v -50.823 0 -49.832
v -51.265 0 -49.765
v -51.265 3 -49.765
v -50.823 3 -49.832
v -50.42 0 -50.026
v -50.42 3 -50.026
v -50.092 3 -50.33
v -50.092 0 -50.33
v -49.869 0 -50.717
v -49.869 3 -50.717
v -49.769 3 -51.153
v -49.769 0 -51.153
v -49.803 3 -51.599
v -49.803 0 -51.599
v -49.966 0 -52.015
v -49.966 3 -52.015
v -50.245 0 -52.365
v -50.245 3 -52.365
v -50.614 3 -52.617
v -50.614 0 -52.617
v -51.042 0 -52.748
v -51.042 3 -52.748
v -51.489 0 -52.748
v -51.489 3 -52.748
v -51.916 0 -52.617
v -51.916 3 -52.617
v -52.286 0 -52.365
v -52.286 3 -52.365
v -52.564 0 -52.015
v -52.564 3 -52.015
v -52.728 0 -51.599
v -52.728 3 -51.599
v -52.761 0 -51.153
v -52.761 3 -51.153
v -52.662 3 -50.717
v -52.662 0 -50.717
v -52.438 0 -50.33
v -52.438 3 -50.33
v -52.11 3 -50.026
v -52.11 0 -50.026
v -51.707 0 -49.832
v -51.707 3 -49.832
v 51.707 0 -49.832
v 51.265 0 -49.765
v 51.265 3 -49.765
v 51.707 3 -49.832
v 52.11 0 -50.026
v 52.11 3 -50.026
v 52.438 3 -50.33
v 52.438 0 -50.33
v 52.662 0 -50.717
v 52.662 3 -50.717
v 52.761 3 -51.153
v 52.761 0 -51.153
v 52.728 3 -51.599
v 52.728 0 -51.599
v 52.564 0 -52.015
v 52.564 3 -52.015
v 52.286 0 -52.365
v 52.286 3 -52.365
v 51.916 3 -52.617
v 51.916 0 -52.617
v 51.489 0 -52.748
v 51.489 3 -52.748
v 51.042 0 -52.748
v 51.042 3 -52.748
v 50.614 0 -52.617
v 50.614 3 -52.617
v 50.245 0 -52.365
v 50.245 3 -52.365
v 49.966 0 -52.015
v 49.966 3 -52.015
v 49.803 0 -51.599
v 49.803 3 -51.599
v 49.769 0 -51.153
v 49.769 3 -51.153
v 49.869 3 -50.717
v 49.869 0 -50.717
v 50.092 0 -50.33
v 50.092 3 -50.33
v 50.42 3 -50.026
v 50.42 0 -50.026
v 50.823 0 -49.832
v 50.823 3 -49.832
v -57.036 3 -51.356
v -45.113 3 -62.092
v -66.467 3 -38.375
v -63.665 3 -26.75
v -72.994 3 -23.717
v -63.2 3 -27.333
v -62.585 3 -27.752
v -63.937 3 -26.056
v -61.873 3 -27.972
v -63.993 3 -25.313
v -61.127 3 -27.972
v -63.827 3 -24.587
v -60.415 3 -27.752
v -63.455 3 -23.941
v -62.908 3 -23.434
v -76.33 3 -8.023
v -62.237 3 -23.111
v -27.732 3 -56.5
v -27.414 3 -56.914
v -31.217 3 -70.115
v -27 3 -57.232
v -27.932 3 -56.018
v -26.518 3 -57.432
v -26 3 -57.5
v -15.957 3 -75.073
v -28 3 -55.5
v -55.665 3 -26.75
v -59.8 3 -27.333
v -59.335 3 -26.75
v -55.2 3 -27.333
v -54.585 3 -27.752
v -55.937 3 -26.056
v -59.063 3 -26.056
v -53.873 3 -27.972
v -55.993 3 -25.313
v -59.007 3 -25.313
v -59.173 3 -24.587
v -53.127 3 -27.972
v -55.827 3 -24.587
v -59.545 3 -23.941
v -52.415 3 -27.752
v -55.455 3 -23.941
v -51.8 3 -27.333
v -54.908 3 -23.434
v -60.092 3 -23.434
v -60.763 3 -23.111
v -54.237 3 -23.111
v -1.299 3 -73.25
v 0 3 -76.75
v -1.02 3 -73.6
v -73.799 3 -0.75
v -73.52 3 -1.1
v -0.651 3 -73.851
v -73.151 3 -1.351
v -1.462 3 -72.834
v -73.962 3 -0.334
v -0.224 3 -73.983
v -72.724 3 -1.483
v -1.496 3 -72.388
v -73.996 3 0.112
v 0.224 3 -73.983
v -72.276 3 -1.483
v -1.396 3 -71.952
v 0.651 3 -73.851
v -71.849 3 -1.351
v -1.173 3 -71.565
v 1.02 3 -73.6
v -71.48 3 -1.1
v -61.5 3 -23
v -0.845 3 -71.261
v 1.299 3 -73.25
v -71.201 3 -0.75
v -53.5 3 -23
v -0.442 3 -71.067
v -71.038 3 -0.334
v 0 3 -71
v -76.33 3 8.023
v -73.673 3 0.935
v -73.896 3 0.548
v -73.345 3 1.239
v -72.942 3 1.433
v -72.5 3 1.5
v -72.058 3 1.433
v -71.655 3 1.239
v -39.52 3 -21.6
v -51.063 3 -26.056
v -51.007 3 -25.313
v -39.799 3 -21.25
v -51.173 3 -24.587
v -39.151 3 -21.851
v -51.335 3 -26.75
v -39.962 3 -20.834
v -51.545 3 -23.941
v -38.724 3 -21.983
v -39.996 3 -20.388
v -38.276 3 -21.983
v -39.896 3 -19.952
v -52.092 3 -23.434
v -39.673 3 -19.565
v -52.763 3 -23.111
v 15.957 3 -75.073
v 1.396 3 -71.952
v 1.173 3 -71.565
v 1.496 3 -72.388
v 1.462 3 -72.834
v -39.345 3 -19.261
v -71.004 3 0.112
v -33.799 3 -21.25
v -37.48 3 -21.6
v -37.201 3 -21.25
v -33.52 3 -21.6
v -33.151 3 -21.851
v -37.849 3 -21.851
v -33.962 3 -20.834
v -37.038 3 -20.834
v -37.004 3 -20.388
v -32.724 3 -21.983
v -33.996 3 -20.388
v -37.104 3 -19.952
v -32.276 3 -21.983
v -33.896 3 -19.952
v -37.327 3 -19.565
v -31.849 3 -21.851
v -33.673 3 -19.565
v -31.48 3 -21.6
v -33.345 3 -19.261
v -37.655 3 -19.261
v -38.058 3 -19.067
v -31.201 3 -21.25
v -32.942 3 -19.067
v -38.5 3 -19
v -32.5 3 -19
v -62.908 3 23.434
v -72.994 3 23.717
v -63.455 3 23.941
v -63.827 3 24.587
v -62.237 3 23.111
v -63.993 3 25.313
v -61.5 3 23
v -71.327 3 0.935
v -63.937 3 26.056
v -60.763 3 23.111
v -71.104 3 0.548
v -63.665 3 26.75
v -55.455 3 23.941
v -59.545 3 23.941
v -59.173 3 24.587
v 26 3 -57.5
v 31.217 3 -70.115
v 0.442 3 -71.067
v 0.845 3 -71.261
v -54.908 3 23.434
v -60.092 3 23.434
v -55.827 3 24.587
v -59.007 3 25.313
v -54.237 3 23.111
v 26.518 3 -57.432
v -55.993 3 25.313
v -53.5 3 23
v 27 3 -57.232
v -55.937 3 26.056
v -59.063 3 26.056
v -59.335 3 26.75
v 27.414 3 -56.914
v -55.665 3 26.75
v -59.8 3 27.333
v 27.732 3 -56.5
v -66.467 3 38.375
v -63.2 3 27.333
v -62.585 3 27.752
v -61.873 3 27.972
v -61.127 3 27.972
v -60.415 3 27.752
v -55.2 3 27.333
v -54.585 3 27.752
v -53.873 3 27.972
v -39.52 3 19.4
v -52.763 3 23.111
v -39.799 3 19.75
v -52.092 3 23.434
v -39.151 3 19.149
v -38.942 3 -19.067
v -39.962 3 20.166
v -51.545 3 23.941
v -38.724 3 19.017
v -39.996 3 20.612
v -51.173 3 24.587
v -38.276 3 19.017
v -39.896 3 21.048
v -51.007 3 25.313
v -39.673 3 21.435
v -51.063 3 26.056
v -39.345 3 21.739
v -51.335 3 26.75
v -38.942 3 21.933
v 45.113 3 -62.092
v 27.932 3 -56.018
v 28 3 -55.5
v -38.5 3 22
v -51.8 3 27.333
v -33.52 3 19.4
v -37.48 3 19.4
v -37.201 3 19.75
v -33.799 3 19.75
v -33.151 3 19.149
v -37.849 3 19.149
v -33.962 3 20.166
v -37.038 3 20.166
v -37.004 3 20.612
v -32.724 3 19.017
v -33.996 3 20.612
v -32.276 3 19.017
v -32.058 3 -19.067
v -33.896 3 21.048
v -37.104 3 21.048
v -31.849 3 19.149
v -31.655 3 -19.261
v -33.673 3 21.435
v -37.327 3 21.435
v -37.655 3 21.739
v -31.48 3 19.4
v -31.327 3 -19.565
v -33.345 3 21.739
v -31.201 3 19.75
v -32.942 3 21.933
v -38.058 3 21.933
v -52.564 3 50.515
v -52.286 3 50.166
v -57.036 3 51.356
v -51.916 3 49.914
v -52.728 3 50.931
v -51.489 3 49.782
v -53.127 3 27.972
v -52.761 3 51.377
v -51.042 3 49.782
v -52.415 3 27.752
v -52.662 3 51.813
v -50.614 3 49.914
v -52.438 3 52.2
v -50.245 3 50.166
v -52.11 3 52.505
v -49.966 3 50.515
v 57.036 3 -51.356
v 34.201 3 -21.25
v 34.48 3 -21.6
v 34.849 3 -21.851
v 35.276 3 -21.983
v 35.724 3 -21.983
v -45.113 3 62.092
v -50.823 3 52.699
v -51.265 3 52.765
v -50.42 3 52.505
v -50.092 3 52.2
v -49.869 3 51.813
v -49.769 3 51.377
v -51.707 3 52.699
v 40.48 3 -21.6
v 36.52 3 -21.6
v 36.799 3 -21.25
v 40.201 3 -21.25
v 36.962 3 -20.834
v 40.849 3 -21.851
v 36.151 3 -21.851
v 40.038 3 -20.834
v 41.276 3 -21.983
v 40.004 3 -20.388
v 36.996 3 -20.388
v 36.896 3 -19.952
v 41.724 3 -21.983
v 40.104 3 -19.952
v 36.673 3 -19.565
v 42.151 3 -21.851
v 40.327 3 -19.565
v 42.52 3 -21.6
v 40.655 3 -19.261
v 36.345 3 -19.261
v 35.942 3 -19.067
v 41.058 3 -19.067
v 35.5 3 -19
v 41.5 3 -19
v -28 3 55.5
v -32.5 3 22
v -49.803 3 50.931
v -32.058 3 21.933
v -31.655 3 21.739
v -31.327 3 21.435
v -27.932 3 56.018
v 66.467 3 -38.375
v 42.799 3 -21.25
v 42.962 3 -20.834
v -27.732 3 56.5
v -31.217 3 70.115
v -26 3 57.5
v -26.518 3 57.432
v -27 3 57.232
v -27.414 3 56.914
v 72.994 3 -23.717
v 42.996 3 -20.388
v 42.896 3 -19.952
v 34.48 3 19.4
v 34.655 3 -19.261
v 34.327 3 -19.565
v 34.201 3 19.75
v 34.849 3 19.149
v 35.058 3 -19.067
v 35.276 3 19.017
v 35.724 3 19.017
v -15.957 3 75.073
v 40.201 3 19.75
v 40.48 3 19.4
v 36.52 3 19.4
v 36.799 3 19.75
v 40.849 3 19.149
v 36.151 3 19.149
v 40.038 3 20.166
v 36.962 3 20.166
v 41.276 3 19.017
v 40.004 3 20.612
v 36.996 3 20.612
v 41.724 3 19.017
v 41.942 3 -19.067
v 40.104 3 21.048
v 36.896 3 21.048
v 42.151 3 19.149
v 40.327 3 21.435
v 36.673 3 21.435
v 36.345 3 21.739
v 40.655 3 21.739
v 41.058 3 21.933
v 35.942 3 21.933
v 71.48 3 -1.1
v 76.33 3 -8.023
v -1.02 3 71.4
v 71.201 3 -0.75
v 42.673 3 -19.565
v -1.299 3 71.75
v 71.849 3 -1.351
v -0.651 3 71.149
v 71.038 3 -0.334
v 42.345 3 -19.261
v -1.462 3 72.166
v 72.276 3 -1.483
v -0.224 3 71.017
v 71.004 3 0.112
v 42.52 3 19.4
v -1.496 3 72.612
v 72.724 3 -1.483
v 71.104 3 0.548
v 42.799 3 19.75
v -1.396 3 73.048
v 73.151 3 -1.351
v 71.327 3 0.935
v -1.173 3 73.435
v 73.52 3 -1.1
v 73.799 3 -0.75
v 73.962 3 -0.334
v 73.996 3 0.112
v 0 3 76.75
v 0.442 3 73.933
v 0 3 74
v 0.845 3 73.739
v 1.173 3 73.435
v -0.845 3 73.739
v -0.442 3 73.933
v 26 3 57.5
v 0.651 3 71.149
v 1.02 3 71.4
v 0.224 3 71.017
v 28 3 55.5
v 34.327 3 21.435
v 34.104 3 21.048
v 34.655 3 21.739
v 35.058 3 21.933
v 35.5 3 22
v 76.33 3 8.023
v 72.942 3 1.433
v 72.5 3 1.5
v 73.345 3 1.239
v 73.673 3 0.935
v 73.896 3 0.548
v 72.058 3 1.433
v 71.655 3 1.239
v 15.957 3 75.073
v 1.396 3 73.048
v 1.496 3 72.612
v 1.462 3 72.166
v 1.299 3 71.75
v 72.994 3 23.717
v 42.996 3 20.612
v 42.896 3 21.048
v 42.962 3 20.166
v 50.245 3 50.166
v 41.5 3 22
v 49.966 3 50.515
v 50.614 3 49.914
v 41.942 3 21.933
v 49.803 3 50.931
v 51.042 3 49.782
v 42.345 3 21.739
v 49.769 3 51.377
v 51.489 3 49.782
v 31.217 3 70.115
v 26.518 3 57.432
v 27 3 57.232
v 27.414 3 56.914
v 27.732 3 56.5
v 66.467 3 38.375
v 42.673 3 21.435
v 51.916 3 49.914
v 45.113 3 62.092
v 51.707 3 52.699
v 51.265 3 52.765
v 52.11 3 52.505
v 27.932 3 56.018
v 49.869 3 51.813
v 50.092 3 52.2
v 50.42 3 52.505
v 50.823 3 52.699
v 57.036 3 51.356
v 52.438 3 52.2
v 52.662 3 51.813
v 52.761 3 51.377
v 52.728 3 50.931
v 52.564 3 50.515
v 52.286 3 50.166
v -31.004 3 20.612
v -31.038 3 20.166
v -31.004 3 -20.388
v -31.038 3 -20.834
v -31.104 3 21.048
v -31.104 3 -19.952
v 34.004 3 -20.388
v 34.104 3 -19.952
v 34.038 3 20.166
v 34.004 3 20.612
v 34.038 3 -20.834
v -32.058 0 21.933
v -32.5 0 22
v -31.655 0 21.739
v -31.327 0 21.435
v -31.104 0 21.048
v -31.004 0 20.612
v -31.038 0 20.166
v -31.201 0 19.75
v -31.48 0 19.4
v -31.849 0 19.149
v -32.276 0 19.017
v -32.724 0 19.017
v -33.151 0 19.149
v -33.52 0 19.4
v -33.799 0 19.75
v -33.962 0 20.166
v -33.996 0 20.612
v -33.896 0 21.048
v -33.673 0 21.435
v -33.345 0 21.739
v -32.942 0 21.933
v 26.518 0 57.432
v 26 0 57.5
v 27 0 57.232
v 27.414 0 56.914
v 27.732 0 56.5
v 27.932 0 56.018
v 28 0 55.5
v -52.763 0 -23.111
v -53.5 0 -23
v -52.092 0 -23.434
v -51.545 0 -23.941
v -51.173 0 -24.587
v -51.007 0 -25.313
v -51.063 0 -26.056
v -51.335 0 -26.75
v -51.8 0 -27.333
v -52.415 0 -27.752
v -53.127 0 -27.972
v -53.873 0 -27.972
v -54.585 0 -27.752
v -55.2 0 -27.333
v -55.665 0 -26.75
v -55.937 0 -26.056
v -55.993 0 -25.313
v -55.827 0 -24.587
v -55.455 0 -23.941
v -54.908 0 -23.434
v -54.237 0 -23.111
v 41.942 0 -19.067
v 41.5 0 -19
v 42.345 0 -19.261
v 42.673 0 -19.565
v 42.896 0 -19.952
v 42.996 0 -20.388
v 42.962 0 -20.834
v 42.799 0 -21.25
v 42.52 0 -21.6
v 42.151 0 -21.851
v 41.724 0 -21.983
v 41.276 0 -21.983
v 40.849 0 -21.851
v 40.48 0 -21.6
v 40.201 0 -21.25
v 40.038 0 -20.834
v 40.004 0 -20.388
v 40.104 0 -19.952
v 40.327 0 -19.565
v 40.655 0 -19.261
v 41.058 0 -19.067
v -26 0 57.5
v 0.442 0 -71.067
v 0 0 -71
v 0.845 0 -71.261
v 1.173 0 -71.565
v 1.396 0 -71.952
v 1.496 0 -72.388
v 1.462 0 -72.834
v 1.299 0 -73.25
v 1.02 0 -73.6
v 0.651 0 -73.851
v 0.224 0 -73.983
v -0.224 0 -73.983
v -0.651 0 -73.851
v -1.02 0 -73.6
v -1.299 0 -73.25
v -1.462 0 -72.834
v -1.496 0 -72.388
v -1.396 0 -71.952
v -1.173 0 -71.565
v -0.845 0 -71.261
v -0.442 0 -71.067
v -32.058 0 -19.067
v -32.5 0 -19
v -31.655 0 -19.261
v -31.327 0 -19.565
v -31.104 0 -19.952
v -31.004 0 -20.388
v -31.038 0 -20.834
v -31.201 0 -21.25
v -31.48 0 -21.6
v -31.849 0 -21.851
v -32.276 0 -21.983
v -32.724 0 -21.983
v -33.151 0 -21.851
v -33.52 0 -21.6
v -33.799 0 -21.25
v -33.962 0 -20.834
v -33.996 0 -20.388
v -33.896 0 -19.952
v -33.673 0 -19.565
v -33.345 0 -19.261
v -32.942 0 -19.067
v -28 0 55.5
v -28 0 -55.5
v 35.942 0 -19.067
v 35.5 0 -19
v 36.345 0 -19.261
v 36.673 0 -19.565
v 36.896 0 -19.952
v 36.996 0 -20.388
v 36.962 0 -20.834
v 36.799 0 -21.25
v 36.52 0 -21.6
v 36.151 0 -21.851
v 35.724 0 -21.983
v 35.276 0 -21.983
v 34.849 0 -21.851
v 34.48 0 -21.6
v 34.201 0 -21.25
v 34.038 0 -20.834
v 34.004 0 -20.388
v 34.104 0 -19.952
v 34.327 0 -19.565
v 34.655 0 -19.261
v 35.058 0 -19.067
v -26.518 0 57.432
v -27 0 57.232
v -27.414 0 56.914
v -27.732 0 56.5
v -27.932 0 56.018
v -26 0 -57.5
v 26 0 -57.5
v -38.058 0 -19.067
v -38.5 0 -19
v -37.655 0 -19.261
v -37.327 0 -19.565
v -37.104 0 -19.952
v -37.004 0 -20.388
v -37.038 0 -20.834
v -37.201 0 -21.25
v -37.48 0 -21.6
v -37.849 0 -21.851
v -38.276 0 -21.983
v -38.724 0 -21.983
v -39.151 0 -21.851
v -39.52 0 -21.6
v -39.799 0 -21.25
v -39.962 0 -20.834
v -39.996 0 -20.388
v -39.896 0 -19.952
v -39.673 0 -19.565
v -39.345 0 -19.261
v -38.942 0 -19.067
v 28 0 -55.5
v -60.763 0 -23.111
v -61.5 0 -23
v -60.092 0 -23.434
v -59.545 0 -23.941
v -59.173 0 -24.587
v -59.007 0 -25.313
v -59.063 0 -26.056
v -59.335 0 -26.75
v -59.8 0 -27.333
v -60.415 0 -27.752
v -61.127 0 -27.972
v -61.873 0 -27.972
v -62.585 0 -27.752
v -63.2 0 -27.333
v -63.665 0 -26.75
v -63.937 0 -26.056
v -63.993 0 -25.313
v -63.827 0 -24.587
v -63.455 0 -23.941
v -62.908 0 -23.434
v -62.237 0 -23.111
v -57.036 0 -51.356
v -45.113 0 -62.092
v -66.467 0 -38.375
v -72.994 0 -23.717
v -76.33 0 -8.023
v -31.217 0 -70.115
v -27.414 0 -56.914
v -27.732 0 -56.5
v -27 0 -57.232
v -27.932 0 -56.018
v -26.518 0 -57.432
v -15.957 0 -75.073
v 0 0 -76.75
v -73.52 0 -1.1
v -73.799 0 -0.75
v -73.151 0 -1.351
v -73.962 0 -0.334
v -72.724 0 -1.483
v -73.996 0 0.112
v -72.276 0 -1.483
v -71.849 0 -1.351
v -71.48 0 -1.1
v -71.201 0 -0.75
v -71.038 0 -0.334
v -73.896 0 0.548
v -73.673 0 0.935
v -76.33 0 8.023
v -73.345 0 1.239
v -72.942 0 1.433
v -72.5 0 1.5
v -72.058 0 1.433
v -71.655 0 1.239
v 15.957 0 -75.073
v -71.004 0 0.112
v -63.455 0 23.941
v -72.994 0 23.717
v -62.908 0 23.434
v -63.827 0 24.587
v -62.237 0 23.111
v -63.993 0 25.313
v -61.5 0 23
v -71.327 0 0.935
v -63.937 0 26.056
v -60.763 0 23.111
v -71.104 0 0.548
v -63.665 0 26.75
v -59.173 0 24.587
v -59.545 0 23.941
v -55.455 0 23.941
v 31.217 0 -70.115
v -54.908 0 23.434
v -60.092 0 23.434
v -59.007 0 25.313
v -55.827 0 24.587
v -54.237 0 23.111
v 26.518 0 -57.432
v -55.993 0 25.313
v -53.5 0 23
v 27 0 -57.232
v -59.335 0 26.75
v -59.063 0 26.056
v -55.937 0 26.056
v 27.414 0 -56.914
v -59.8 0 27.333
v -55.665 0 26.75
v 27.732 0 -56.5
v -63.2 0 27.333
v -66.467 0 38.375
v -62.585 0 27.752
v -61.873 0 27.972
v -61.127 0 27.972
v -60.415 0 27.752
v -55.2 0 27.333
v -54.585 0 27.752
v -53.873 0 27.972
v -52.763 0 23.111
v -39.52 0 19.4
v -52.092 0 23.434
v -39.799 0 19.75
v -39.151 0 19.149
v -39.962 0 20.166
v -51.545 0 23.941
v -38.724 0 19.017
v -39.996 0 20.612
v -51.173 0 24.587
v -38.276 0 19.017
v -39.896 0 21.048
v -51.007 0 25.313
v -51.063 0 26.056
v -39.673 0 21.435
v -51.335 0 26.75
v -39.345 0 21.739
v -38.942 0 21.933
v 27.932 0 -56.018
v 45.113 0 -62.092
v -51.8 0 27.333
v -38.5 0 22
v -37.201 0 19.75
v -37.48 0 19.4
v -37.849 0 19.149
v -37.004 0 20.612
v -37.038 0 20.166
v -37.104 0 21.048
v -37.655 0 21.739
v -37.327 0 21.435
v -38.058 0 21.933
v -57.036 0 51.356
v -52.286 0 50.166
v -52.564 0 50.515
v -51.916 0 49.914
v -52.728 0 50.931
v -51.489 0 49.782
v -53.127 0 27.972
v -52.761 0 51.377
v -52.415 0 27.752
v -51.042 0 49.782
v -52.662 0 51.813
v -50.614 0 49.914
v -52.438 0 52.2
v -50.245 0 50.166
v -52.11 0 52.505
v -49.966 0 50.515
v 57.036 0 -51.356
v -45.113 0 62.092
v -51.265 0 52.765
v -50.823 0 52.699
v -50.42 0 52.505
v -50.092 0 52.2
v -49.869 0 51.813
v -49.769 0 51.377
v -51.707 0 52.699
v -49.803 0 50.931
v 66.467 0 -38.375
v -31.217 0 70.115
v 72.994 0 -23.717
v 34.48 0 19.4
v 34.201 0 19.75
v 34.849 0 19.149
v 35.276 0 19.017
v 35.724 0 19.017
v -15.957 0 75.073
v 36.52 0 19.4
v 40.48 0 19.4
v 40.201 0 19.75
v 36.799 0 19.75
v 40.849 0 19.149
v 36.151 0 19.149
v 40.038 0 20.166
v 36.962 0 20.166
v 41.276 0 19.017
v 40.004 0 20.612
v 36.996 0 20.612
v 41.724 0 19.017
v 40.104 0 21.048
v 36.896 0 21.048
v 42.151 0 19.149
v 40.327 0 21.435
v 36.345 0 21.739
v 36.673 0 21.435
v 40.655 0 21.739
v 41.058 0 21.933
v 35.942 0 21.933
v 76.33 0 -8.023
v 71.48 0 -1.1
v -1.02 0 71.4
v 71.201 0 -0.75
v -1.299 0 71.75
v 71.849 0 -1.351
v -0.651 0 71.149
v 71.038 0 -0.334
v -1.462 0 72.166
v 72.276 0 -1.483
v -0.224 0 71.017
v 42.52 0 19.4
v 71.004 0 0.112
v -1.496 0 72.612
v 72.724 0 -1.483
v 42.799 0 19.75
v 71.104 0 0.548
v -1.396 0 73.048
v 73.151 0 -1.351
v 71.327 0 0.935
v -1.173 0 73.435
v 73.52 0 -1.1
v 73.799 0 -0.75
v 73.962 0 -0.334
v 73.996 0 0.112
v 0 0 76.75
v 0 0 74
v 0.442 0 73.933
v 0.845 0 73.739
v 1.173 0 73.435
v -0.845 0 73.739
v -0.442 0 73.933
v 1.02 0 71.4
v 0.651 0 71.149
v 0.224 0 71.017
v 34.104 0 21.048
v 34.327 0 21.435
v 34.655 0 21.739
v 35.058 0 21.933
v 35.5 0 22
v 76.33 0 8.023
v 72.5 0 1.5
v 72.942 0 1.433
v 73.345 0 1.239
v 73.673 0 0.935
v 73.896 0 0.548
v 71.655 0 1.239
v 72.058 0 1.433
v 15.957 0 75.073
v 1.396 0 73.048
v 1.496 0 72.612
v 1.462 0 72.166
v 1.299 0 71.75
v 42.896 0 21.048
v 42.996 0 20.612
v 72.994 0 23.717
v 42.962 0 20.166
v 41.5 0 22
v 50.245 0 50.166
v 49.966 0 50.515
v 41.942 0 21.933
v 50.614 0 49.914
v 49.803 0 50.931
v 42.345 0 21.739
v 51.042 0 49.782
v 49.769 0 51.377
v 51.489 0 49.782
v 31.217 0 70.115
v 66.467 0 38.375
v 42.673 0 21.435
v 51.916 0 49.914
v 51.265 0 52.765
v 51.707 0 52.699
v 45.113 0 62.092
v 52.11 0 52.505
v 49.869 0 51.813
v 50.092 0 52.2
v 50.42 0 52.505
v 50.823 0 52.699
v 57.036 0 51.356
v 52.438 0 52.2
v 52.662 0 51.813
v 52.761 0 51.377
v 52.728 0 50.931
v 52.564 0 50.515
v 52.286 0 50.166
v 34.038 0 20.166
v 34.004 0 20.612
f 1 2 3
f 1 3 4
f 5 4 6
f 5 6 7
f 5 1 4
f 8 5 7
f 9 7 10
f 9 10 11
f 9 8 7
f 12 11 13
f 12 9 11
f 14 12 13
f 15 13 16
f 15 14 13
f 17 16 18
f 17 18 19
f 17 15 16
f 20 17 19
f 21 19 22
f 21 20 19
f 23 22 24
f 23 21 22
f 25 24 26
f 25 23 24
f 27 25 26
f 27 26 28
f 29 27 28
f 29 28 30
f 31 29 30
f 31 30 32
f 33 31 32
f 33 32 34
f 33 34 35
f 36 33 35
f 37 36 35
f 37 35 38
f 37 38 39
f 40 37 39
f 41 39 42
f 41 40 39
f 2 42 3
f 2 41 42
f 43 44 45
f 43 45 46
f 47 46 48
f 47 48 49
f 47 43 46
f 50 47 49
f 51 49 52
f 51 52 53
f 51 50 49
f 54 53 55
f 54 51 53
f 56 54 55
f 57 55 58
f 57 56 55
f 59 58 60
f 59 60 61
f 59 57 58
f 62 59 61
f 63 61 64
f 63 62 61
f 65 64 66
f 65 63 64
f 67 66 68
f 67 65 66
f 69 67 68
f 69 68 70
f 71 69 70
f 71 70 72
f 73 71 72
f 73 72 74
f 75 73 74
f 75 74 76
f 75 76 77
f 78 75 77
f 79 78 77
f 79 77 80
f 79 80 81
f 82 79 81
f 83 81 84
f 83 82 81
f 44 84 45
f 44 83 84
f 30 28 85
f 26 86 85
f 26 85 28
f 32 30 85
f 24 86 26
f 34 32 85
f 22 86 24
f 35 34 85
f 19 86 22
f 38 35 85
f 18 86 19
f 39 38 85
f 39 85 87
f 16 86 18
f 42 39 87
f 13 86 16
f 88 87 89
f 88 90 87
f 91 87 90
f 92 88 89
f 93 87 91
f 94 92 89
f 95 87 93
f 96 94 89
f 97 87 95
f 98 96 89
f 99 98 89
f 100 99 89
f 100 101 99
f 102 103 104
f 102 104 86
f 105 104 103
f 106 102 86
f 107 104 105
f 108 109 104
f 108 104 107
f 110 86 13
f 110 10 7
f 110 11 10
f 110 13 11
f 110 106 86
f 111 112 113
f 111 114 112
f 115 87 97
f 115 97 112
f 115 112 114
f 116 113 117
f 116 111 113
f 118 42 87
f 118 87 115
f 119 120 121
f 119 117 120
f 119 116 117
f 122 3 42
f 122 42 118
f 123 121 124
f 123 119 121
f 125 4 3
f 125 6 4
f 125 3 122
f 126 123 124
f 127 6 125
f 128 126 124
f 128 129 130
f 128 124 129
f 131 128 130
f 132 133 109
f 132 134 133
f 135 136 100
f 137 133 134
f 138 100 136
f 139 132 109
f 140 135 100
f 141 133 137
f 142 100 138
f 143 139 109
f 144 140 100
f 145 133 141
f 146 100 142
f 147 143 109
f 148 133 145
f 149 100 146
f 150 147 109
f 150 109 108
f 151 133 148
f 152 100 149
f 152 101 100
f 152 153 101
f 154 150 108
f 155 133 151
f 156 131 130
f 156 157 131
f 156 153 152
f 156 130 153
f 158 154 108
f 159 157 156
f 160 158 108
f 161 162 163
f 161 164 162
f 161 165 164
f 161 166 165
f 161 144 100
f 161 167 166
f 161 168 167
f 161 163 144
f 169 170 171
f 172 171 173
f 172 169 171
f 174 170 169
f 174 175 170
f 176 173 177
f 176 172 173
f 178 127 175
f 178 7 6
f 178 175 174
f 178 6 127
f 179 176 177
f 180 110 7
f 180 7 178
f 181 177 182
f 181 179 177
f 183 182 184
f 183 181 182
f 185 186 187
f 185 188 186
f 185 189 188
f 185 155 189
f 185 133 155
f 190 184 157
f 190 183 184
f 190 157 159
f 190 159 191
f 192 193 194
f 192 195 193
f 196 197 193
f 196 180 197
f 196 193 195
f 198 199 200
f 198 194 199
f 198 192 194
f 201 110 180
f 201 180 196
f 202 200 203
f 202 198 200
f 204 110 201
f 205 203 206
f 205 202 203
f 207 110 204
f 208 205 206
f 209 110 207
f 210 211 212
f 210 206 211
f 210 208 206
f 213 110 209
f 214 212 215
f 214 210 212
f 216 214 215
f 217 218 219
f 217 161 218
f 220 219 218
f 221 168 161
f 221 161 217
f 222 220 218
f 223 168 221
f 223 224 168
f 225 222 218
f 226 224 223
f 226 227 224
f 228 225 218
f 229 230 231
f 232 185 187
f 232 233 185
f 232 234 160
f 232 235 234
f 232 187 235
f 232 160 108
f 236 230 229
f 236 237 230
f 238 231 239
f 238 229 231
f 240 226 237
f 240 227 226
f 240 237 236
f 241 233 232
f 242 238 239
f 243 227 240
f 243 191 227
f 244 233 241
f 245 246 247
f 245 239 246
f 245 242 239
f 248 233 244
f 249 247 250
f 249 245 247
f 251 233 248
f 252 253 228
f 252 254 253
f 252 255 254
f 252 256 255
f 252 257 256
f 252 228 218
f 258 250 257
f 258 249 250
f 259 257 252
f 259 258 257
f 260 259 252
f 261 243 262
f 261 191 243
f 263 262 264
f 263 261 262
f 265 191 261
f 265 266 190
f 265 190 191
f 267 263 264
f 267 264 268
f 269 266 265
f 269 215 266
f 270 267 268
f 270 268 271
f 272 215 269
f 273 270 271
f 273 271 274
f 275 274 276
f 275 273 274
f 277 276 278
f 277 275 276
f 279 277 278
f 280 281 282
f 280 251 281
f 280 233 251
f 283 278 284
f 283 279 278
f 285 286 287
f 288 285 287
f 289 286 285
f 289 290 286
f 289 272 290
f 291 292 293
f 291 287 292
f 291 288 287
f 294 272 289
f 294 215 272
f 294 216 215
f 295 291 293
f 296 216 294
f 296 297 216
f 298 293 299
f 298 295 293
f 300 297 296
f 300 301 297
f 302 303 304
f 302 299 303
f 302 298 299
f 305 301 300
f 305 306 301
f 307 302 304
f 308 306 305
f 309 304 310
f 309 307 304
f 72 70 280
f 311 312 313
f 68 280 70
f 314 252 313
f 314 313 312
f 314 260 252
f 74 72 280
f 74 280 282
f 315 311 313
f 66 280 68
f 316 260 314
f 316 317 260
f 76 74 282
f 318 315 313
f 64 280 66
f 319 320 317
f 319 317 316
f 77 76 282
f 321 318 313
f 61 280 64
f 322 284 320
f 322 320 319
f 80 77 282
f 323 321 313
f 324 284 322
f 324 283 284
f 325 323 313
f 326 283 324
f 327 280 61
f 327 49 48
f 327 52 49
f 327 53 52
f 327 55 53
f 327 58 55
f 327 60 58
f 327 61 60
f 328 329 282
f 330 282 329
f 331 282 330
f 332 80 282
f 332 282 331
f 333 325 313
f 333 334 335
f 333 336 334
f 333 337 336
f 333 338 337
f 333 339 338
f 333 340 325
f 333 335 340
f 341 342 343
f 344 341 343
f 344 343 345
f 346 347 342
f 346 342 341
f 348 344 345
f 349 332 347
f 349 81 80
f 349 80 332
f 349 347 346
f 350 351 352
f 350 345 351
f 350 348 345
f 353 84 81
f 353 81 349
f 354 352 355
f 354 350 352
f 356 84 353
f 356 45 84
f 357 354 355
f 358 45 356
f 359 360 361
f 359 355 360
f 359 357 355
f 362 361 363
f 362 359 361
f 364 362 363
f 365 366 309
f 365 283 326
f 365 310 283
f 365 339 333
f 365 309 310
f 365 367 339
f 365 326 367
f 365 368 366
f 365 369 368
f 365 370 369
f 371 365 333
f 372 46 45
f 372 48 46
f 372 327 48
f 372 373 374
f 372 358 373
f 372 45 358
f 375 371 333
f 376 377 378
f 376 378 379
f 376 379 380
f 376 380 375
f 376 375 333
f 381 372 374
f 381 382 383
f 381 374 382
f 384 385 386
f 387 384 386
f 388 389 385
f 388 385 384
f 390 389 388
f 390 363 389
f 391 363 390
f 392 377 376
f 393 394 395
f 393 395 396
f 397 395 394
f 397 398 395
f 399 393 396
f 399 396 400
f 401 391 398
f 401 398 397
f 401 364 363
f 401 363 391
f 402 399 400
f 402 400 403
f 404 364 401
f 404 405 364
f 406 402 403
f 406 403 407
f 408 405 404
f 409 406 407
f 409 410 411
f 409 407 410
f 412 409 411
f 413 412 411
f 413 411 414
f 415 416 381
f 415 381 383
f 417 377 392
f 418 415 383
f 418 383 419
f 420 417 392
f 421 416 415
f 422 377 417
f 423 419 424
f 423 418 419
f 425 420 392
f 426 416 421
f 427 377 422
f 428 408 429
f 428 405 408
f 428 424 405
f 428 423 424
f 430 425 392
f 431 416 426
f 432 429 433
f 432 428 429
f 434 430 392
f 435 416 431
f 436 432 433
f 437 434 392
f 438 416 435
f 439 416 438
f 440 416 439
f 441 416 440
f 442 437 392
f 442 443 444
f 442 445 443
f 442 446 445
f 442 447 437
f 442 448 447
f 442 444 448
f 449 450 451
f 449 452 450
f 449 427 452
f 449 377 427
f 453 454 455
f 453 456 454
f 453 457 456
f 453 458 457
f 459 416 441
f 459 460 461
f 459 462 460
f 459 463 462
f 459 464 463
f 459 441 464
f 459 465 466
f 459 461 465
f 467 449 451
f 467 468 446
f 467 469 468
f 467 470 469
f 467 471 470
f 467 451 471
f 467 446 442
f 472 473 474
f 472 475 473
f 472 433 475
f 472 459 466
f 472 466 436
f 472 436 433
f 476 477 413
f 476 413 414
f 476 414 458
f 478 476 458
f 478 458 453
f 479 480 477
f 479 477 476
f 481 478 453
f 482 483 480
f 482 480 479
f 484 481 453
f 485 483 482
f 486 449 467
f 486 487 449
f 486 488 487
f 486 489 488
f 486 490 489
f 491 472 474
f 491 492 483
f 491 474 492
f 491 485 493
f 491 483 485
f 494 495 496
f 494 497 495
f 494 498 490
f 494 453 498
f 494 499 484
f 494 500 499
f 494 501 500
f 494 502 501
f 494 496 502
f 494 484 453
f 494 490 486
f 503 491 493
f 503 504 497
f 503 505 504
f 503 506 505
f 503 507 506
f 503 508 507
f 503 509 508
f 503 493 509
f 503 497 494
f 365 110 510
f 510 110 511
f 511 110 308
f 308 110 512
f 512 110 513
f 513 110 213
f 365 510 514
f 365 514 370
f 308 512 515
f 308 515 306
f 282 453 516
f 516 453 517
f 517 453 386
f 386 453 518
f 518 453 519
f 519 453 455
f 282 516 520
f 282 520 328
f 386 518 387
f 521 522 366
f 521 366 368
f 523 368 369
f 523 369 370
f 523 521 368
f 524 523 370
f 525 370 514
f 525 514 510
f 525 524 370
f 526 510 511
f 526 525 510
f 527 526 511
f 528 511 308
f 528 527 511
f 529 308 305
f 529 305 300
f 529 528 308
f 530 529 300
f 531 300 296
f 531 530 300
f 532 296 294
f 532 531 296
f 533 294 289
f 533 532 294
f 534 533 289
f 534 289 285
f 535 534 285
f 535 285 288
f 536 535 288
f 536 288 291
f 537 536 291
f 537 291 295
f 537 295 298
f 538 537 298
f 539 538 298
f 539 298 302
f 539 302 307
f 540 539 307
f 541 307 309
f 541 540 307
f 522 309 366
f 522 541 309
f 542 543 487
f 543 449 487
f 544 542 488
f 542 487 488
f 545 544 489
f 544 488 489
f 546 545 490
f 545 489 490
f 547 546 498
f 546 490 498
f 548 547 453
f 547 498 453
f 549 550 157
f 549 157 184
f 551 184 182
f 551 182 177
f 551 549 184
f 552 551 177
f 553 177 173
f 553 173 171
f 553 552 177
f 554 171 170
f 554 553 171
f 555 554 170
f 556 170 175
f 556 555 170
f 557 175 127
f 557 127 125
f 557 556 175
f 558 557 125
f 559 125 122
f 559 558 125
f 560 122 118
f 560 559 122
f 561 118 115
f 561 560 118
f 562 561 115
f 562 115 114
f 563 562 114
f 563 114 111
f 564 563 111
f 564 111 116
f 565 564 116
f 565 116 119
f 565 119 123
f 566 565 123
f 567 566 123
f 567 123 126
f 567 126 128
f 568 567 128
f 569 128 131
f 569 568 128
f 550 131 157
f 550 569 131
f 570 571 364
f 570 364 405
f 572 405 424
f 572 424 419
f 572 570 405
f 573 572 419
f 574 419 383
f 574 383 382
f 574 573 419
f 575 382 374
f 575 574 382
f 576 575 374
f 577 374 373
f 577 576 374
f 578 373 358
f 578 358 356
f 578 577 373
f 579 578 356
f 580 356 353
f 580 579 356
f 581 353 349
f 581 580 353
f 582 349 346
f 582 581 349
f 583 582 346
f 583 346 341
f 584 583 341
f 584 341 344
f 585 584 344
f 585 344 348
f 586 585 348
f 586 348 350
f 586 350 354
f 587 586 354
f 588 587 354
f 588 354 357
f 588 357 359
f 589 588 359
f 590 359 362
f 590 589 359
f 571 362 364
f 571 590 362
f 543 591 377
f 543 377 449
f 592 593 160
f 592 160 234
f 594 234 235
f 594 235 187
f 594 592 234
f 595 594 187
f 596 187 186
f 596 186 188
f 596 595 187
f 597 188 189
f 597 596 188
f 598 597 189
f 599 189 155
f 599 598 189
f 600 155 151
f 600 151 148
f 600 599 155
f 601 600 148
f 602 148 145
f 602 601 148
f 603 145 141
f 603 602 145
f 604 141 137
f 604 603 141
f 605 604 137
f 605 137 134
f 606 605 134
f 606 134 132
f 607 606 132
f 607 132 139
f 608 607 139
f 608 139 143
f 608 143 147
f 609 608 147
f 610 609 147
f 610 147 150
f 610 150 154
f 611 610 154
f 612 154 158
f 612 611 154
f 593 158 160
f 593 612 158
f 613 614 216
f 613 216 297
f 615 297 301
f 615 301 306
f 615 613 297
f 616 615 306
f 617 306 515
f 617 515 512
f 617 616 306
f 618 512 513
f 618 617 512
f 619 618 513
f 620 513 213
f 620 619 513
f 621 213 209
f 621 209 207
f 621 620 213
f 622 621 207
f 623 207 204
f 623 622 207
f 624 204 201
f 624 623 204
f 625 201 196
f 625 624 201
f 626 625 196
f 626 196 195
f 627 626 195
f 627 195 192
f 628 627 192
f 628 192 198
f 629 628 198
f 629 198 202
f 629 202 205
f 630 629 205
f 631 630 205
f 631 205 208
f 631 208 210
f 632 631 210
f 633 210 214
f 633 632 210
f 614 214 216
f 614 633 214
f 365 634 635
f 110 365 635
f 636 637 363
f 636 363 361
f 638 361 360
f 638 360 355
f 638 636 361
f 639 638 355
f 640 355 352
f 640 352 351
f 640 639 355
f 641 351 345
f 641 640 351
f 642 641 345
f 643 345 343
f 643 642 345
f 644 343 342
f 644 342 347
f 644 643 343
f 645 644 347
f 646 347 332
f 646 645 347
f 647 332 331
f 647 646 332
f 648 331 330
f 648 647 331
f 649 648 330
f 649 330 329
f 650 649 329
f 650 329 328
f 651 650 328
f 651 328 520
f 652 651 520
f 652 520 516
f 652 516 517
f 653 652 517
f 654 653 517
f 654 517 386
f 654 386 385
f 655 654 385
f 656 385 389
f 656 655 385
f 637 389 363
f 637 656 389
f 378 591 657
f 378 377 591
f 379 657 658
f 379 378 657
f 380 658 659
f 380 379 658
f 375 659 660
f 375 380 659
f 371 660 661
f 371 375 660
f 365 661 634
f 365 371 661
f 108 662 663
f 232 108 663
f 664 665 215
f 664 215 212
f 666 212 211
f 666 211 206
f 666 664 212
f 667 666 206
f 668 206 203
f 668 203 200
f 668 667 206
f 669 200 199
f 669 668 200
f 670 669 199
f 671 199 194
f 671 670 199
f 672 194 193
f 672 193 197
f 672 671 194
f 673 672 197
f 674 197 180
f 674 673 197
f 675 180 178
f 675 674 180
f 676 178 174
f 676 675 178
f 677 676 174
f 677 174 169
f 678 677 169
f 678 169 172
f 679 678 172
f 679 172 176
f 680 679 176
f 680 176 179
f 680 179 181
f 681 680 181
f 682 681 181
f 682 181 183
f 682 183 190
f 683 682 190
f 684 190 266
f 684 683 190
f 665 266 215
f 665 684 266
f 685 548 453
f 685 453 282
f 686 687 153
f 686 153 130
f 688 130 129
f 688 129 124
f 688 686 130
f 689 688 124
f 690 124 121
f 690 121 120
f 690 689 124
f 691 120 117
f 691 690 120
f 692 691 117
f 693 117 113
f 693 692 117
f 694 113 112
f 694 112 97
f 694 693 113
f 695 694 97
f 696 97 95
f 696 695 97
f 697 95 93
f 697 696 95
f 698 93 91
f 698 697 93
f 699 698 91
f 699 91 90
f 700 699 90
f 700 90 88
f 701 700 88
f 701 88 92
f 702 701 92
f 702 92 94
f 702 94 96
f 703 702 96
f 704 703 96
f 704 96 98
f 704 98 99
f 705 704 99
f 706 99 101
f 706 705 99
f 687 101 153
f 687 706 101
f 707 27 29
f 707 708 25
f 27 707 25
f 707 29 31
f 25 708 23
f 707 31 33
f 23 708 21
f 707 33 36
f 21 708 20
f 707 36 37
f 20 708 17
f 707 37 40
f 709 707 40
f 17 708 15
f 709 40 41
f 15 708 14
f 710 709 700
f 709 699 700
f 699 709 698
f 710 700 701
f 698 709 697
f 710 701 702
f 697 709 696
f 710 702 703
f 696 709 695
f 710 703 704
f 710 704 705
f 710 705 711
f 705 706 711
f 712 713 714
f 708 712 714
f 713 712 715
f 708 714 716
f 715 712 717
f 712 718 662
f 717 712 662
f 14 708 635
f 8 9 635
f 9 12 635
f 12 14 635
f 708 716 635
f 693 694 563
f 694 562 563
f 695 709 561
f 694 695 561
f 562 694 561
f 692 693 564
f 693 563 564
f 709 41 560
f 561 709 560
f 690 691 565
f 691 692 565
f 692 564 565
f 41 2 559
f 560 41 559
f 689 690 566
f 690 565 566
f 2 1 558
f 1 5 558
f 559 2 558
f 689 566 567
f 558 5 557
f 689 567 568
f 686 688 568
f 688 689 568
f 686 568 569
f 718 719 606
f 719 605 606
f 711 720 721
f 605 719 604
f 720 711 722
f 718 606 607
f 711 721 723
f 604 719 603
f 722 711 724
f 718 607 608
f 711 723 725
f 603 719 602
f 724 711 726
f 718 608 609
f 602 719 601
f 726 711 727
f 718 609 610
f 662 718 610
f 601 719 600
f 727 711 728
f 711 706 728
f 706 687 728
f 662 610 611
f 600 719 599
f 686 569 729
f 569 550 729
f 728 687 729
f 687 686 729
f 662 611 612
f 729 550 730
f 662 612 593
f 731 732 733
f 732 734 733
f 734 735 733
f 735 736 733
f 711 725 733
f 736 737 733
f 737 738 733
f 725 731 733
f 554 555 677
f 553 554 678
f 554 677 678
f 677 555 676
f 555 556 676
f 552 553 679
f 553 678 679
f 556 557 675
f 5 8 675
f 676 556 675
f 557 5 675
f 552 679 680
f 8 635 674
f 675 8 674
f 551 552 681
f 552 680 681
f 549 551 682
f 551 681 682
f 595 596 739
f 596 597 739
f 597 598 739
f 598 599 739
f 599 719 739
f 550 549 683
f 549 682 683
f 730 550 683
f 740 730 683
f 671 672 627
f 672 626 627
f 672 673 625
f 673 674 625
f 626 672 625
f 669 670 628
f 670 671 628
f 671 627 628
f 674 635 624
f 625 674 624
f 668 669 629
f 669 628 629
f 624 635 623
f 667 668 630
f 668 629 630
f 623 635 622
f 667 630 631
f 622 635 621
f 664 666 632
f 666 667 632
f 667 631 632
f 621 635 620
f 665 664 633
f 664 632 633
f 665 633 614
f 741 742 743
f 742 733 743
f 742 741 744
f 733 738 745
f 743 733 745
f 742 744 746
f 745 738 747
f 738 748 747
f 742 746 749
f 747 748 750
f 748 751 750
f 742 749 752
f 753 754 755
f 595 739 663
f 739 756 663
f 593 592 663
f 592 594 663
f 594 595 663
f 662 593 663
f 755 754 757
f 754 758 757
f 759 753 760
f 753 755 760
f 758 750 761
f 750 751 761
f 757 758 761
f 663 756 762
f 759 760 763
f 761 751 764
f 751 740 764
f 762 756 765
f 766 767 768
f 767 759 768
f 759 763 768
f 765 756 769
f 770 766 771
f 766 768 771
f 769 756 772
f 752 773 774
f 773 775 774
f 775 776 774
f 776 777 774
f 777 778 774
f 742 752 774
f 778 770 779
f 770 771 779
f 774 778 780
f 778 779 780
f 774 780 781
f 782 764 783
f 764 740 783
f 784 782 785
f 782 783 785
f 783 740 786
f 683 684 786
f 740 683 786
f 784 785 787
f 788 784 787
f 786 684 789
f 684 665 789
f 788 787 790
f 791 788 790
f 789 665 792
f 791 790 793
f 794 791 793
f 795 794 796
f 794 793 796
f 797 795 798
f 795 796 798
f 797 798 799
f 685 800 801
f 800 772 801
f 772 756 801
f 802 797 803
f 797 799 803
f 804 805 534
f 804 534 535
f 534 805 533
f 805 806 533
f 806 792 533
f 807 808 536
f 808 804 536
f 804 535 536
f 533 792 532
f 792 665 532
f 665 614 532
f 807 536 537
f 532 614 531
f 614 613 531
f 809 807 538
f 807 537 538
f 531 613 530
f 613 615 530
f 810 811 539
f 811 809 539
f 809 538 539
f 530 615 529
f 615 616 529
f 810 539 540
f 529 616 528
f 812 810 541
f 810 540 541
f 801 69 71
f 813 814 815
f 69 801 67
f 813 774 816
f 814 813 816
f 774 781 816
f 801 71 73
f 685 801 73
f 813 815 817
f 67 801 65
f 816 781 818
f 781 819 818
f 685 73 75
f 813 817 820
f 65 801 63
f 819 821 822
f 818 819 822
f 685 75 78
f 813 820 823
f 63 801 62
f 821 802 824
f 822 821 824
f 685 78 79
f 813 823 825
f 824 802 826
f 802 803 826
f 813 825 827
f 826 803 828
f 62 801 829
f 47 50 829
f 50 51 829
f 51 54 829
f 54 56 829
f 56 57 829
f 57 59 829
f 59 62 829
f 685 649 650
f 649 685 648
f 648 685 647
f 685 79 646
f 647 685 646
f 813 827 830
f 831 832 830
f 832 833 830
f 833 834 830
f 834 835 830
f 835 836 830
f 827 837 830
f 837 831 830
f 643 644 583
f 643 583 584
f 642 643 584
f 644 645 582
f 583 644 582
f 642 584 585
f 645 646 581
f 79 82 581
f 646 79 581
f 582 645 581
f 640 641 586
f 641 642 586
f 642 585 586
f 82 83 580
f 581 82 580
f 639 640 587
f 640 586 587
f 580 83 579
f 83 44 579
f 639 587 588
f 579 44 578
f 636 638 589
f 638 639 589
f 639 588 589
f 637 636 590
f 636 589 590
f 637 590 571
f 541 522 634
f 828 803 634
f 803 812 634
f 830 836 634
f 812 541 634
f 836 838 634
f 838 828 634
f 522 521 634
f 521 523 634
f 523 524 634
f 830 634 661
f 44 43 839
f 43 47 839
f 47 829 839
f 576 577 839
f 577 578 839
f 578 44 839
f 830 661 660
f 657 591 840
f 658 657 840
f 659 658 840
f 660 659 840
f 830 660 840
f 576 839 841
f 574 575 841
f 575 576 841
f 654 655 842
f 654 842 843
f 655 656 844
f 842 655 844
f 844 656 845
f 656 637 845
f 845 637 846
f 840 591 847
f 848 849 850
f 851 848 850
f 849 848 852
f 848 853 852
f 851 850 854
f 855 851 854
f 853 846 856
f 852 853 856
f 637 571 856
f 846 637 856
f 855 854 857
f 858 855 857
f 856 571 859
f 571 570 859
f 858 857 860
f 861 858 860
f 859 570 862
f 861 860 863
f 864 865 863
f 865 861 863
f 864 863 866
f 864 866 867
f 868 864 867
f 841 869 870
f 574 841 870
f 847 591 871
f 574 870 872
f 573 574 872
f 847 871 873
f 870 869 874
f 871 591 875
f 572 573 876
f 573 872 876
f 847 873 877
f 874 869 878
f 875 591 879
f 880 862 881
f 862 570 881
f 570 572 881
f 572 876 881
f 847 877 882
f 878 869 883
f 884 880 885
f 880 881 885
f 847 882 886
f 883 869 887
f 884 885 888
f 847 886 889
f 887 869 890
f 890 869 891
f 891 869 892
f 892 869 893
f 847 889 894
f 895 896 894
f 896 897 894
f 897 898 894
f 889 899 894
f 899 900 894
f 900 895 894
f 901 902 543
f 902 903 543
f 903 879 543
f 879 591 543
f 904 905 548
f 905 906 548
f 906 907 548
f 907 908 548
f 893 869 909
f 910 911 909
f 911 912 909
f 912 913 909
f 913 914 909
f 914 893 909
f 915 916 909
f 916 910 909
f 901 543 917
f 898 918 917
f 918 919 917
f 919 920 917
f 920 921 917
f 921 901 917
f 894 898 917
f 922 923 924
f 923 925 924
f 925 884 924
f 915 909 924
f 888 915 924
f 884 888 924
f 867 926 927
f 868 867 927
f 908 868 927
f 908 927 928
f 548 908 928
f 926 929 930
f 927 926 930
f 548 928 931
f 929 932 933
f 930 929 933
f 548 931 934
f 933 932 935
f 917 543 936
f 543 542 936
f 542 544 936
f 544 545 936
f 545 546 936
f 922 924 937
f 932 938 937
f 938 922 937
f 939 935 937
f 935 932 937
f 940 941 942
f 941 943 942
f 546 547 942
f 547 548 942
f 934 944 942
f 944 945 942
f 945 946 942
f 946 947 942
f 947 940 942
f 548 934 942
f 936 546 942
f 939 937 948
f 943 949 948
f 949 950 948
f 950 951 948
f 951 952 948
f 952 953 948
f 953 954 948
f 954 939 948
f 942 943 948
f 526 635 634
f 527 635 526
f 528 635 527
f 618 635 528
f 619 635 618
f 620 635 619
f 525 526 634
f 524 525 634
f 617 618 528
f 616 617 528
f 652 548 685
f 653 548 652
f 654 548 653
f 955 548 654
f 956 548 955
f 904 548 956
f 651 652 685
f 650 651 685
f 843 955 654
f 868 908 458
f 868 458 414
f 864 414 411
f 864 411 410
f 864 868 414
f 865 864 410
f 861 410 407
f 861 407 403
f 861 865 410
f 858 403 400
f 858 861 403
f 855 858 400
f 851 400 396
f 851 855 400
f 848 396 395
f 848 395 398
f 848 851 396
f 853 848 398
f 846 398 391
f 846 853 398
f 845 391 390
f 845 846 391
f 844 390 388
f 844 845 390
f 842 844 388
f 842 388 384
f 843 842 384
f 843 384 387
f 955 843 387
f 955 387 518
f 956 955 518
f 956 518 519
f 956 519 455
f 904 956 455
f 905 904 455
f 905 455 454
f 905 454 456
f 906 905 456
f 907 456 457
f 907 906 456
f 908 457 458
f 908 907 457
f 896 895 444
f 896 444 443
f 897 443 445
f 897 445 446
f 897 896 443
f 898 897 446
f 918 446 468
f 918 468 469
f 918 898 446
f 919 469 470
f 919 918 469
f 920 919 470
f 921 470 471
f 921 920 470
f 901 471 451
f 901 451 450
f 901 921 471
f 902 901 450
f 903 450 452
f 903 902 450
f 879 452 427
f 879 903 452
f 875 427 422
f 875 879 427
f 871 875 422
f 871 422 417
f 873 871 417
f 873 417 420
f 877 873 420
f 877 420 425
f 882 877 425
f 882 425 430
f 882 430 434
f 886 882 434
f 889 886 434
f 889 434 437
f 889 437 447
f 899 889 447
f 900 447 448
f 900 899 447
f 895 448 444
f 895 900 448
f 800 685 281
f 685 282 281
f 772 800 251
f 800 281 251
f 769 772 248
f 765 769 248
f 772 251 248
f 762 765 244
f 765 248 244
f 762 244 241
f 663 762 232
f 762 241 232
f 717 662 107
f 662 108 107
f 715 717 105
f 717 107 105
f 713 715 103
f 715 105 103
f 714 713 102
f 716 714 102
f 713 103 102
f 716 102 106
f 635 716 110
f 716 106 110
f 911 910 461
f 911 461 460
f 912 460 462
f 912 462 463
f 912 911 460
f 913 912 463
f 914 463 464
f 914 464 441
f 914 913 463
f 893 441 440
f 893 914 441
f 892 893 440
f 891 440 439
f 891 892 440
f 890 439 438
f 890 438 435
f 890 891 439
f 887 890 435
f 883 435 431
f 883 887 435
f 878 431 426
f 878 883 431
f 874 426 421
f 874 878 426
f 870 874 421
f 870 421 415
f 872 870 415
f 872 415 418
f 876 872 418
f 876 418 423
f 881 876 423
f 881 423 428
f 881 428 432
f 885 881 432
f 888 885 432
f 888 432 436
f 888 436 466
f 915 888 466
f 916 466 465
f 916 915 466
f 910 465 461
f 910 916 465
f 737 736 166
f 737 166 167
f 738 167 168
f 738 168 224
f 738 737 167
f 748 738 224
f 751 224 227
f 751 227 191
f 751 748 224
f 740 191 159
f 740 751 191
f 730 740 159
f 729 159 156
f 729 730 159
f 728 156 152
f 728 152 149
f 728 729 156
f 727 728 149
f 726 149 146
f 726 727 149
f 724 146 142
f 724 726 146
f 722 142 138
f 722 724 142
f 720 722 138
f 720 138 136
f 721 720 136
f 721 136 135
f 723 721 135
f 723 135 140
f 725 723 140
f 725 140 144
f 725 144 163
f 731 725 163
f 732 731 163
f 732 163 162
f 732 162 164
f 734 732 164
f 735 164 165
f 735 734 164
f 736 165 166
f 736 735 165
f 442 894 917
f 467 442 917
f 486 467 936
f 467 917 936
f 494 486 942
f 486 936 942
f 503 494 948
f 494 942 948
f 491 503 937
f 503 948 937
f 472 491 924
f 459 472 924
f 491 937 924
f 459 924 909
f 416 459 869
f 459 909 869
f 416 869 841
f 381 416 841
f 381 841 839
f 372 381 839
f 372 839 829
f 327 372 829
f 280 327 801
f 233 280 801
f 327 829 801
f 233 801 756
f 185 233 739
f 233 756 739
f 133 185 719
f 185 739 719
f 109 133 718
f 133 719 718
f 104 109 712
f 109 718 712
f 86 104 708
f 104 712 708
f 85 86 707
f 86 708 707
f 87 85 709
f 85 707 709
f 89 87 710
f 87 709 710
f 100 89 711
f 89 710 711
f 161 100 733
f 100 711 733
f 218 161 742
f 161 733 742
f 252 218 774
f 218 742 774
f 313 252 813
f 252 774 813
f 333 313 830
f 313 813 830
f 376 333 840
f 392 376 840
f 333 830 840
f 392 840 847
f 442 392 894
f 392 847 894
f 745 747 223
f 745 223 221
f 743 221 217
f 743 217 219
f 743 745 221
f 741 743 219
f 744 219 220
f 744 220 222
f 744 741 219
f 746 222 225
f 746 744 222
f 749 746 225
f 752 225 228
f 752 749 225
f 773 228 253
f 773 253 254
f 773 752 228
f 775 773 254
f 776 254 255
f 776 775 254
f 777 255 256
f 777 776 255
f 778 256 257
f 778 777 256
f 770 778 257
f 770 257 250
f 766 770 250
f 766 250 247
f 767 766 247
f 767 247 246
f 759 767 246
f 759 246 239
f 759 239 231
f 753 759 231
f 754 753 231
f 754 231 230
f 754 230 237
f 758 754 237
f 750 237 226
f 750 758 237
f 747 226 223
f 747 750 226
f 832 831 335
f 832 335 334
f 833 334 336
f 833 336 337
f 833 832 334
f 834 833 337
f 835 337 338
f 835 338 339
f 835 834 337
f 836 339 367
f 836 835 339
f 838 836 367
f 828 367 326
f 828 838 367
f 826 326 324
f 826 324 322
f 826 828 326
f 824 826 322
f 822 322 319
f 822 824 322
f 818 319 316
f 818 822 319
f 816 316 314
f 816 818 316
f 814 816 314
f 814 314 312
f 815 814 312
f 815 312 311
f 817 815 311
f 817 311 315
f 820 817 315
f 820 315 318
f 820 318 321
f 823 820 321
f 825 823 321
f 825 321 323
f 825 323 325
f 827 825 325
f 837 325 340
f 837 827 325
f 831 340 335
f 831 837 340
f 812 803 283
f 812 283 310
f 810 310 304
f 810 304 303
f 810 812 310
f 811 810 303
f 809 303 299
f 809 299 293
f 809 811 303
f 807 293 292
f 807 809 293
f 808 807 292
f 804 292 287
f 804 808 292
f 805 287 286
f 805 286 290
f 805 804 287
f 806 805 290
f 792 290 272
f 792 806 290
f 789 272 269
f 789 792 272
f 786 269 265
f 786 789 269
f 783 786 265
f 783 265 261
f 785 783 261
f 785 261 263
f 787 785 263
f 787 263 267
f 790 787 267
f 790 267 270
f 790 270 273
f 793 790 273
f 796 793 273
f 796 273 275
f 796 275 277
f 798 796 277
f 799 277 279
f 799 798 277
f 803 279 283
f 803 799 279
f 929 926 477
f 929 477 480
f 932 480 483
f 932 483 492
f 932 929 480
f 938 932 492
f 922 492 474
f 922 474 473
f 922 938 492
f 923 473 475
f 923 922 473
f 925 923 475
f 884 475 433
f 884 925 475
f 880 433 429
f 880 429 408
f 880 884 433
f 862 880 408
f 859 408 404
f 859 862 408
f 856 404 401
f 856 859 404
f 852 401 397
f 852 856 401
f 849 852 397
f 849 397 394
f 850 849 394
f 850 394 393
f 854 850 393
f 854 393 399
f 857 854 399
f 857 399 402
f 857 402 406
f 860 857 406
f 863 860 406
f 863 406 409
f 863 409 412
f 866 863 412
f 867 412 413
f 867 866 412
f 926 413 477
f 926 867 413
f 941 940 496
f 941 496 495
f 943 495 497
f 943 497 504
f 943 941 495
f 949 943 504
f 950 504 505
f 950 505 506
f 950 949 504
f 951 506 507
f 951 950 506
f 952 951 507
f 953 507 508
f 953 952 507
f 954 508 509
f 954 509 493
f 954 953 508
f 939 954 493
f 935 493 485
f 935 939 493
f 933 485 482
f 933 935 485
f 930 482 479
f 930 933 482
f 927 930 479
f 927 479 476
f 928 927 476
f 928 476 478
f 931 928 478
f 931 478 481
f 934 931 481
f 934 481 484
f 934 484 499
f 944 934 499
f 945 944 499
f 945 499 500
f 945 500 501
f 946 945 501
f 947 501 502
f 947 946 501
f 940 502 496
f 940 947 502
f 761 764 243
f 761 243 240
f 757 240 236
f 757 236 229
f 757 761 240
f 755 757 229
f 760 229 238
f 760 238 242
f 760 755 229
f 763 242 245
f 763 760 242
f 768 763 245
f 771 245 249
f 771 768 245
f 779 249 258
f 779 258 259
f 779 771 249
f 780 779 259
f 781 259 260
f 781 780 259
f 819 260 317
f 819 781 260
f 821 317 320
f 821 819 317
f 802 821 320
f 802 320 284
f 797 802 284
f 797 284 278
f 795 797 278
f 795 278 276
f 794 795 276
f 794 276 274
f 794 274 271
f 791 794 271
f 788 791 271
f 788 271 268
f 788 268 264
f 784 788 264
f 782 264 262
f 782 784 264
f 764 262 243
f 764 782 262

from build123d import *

# Parameters (mm, degrees)
SKETCH_1_R      = 76.75
SKETCH_1_R_2    = 1.5
SKETCH_1_R_3    = 2.5
SKETCH_1_W      = 56
SKETCH_1_H      = 115
EXTRUDE_1_DEPTH = 3
FILLET_1_R      = 2


with BuildPart() as part:
    # 草图1 → 凸台-拉伸1 (new body)
    with BuildSketch(Plane(origin=(0, 0, 0), x_dir=(1, 0, 0), z_dir=(0, 1, 0))):
        with Locations(Location((0, 0, 0), (0, 0, 270))):
            Circle(SKETCH_1_R)
        with Locations(Location((0, 72.5, 0), (0, 0, 270))):
            Circle(SKETCH_1_R_2, mode=Mode.SUBTRACT)
        with Locations(Location((51.265241636, 51.265241636, 0), (0, 0, 270))):
            Circle(SKETCH_1_R_2, mode=Mode.SUBTRACT)
        with Locations(Location((72.5, 0, 0), (0, 0, 270))):
            Circle(SKETCH_1_R_2, mode=Mode.SUBTRACT)
        with Locations(Location((51.265241636, -51.265241636, 0), (0, 0, 270))):
            Circle(SKETCH_1_R_2, mode=Mode.SUBTRACT)
        with Locations(Location((0, -72.5, 0), (0, 0, 270))):
            Circle(SKETCH_1_R_2, mode=Mode.SUBTRACT)
        with Locations(Location((-51.265241636, -51.265241636, 0), (0, 0, 270))):
            Circle(SKETCH_1_R_2, mode=Mode.SUBTRACT)
        with Locations(Location((-72.5, 0, 0), (0, 0, 270))):
            Circle(SKETCH_1_R_2, mode=Mode.SUBTRACT)
        with Locations(Location((-51.265241636, 51.265241636, 0), (0, 0, 270))):
            Circle(SKETCH_1_R_2, mode=Mode.SUBTRACT)
        with Locations(Location((-32.5, -20.5, 0), (0, 0, 270))):
            Circle(SKETCH_1_R_2, mode=Mode.SUBTRACT)
        with Locations(Location((-38.5, -20.5, 0), (0, 0, 270))):
            Circle(SKETCH_1_R_2, mode=Mode.SUBTRACT)
        with Locations(Location((-38.5, 20.5, 0), (0, 0, 270))):
            Circle(SKETCH_1_R_2, mode=Mode.SUBTRACT)
        with Locations(Location((-53.5, 25.5, 0), (0, 0, 270))):
            Circle(SKETCH_1_R_3, mode=Mode.SUBTRACT)
        with Locations(Location((-61.5, 25.5, 0), (0, 0, 270))):
            Circle(SKETCH_1_R_3, mode=Mode.SUBTRACT)
        with Locations(Location((-53.5, -25.5, 0), (0, 0, 90))):
            Circle(SKETCH_1_R_3, mode=Mode.SUBTRACT)
        with Locations(Location((-61.5, -25.5, 0), (0, 0, 90))):
            Circle(SKETCH_1_R_3, mode=Mode.SUBTRACT)
        with Locations(Location((-32.5, 20.5, 0), (0, 0, 270))):
            Circle(SKETCH_1_R_2, mode=Mode.SUBTRACT)
        with Locations(Location((35.5, 20.5, 0), (0, 0, 270))):
            Circle(SKETCH_1_R_2, mode=Mode.SUBTRACT)
        with Locations(Location((41.5, 20.5, 0), (0, 0, 270))):
            Circle(SKETCH_1_R_2, mode=Mode.SUBTRACT)
        with Locations(Location((35.5, -20.5, 0), (0, 0, 270))):
            Circle(SKETCH_1_R_2, mode=Mode.SUBTRACT)
        with Locations(Location((41.5, -20.5, 0), (0, 0, 270))):
            Circle(SKETCH_1_R_2, mode=Mode.SUBTRACT)
        Rectangle(SKETCH_1_W, SKETCH_1_H, mode=Mode.SUBTRACT)
    extrude(amount=EXTRUDE_1_DEPTH)

    # 圆角1
    fillet_1_edges = [part.edges().sort_by_distance(p)[0] for p in [
        (28, 1.5, 57.5),
        (28, 1.5, -57.5),
        (-28, 1.5, -57.5),
        (-28, 1.5, 57.5),
    ]]
    fillet(fillet_1_edges, radius=FILLET_1_R)


solid = part.part
